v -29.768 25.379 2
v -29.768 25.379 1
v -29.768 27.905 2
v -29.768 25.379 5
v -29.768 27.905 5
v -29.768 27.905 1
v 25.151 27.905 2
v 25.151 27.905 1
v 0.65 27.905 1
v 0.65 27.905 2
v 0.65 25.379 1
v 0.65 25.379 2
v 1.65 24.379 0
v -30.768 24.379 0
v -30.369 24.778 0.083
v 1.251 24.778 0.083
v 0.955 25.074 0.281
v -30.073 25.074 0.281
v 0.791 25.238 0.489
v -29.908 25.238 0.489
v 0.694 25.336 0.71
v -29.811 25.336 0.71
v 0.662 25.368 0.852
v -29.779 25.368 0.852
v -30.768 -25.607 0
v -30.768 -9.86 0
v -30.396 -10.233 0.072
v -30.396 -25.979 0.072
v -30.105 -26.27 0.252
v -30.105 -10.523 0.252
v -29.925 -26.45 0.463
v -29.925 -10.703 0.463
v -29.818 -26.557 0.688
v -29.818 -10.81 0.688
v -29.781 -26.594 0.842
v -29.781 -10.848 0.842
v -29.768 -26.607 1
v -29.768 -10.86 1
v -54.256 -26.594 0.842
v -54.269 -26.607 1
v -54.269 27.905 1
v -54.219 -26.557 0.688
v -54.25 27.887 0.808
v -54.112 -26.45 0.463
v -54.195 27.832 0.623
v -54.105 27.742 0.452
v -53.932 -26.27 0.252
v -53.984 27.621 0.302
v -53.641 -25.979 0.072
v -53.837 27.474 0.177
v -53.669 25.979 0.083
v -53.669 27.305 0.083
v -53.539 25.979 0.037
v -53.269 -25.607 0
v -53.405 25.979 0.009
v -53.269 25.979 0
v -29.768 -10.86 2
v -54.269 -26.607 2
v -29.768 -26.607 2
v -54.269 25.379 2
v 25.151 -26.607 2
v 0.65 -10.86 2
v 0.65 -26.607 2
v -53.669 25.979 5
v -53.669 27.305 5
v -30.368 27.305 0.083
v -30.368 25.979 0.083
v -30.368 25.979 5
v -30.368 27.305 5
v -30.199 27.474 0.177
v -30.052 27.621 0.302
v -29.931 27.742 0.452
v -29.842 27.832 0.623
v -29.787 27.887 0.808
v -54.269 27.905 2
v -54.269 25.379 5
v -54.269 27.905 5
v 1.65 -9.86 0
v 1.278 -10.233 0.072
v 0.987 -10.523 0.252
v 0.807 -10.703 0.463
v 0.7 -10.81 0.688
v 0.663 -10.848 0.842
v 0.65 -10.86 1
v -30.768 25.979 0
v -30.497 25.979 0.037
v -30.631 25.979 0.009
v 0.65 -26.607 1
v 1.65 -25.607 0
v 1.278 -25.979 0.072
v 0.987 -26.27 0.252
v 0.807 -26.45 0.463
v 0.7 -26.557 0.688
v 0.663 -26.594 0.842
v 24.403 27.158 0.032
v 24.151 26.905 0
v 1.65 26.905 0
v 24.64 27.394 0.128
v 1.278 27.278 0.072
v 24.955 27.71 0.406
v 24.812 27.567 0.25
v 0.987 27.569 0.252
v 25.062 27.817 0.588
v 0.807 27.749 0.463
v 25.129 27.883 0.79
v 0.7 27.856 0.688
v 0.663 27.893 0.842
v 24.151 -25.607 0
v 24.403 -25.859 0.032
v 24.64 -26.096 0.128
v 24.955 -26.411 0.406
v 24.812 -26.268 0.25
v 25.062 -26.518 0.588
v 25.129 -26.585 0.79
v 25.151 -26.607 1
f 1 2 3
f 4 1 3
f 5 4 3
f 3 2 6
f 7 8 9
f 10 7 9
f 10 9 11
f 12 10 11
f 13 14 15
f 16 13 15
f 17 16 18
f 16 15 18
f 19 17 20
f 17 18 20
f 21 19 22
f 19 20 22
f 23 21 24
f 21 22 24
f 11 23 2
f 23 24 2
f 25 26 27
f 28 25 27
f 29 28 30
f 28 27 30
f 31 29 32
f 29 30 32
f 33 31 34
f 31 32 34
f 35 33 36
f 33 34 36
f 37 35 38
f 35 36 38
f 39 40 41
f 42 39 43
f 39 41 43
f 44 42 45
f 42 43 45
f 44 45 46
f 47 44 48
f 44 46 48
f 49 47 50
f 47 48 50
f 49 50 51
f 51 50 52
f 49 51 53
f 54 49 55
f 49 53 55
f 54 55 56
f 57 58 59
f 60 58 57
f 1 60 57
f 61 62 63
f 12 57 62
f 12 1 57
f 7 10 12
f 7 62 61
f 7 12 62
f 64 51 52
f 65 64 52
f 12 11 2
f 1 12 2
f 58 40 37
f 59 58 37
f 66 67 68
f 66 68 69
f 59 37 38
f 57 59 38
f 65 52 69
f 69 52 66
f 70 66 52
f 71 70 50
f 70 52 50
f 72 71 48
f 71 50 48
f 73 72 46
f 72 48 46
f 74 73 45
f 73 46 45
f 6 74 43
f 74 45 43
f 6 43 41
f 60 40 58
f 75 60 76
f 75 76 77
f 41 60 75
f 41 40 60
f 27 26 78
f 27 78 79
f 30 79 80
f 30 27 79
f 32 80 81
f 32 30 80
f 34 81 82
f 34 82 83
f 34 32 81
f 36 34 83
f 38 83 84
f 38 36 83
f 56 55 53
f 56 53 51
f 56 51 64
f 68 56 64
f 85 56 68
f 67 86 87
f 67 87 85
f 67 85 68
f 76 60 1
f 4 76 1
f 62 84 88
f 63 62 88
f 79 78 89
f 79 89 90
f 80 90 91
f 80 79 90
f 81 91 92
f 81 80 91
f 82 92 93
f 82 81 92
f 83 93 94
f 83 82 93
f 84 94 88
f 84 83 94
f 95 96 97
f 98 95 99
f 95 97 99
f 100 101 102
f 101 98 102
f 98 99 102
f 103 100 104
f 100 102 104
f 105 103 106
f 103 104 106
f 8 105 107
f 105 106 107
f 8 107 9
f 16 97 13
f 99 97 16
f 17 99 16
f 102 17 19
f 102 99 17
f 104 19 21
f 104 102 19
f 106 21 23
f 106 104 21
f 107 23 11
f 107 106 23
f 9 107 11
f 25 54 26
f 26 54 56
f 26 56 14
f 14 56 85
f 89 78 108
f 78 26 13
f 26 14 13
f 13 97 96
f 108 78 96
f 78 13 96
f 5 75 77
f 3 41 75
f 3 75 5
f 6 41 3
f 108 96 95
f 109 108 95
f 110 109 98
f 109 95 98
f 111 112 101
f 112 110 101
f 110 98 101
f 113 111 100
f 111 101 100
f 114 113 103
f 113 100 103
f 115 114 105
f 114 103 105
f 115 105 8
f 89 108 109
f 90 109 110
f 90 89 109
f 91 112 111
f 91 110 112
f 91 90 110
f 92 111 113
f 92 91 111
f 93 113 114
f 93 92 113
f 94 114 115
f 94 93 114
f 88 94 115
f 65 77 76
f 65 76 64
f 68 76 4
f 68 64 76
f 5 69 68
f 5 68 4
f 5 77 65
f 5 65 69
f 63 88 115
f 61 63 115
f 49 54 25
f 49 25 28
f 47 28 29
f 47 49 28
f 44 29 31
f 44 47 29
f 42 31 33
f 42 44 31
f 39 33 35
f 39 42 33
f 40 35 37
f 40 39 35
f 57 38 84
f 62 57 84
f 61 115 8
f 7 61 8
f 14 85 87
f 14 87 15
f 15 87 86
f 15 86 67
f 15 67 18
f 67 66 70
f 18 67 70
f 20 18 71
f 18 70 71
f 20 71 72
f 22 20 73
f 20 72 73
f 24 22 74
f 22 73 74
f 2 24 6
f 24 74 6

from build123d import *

# Parameters (mm, degrees)
F1_DEPTH     = 2
F2_W         = 23.3004903048
F2_H         = 1.3265815725
F3_DEPTH     = 2
F2_W_2       = 24.5004919916
F2_H_2       = 2.5265832593
F4_DEPTH     = 3
F5_T1_DEPTH  = 29.5004919916
F5_T3_DEPTH  = 59.5122700134
F5_T5_DEPTH  = 5.0265832593
F5_T7_DEPTH  = 30.4185097339
F5_T9_DEPTH  = 18.246874844
F5_T11_DEPTH = 29.5004919916
F5_T17_DEPTH = 7.5265832593
F5_T21_DEPTH = 32.9185097339
F5_T28_DEPTH = 32.9185097339
F5_T32_DEPTH = 7.5265832593
F5_T39_DEPTH = 20.746874844
F5_T43_DEPTH = 32.9185097339
F5_T50_DEPTH = 32.9185097339
F5_T54_DEPTH = 20.746874844


# Not quite as in the source:
# - a fillet or chamfer that OpenCascade refuses, or shapes differently, is made with other operations: its cross-section is extruded or revolved along the edge and cut away or added


with BuildPart() as f1:
    # F0 (on Top) → F1 (new body)
    with BuildSketch(Plane.XY):
        Polygon((25.1509650471, -26.6069659193), (25.1509650471, 27.9053040941), (0.6504730554, 27.9053040941), (0.6504730554, 25.3787208349), (-29.7680366784, 25.3787208349), (-29.7680366784, 27.9053040941), (-54.2685286701, 27.9053040941), (-54.2685286701, -26.6069659193), (-29.7680366784, -26.6069659193), (-29.7680366784, -10.8600910753), (0.6504730554, -10.8600910753), (0.6504730554, -26.6069659193), align=None)
    extrude(amount=F1_DEPTH)

    # F0 (on Top) + F2 (on face) → F3 (cut)
    with BuildSketch(Plane.XY):
        Polygon((25.1509650471, -26.6069659193), (25.1509650471, 27.9053040941), (0.6504730554, 27.9053040941), (0.6504730554, 25.3787208349), (-29.7680366784, 25.3787208349), (-29.7680366784, 27.9053040941), (-54.2685286701, 27.9053040941), (-54.2685286701, -26.6069659193), (-29.7680366784, -26.6069659193), (-29.7680366784, -10.8600910753), (0.6504730554, -10.8600910753), (0.6504730554, -26.6069659193), align=None)
    with BuildSketch(Plane.XY.offset(2)):
        with Locations((-42.0182826743, 26.6420124645)):
            Rectangle(F2_W, F2_H)
    extrude(amount=-F3_DEPTH, mode=Mode.SUBTRACT)

    # F2 (on face) → F4 (join)
    with BuildSketch(Plane.XY.offset(2)):
        with Locations((-42.0182826743, 26.6420124645)):
            Rectangle(F2_W_2, F2_H_2)
        with Locations((-42.0182826743, 26.6420124645)):
            Rectangle(F2_W, F2_H, mode=Mode.SUBTRACT)
    extrude(amount=F4_DEPTH)

    # F5: fillet of radius 1 on 12 edges, made by hand

    # F5_s2 → F5_t1 (cut)
    with BuildSketch(Plane.YZ.offset(-56.7685286701)):
        with BuildLine():
            ThreePointArc((-25.6069659193, 0), (-26.3140727005, 0.2928932188), (-26.6069659193, 1))
            Line((-26.6069659193, 1), (-26.6069659193, 0))
            Line((-26.6069659193, 0), (-25.6069659193, 0))
        make_face()
        with BuildLine():
            ThreePointArc((26.9053040941, 0), (27.6124108753, 0.2928932188), (27.9053040941, 1))
            Line((27.9053040941, 1), (27.9053040941, 0))
            Line((27.9053040941, 0), (26.9053040941, 0))
        make_face()
    extrude(amount=F5_T1_DEPTH, mode=Mode.SUBTRACT)

    # F5_s4 → F5_t3 (cut)
    with BuildSketch(Plane.XZ.offset(-30.4053040941)):
        with BuildLine():
            ThreePointArc((-54.2685286701, 1), (-53.9756354513, 0.2928932188), (-53.2685286701, 0))
            Line((-53.2685286701, 0), (-54.2685286701, 0))
            Line((-54.2685286701, 0), (-54.2685286701, 1))
        make_face()
        with BuildLine():
            ThreePointArc((24.1509650471, 0), (24.8580718283, 0.2928932188), (25.1509650471, 1))
            Line((25.1509650471, 1), (25.1509650471, 0))
            Line((25.1509650471, 0), (24.1509650471, 0))
        make_face()
    extrude(amount=F5_T3_DEPTH, mode=Mode.SUBTRACT)

    # F5_s6 → F5_t5 (cut)
    with BuildSketch(Plane.XZ.offset(-30.4053040941)):
        with BuildLine():
            ThreePointArc((-30.7680366784, 0), (-30.0609298972, 0.2928932188), (-29.7680366784, 1))
            Line((-29.7680366784, 1), (-29.7680366784, 0))
            Line((-29.7680366784, 0), (-30.7680366784, 0))
        make_face()
        with BuildLine():
            ThreePointArc((1.6504730554, 0), (0.9433662742, 0.2928932188), (0.6504730554, 1))
            Line((0.6504730554, 1), (0.6504730554, 0))
            Line((0.6504730554, 0), (1.6504730554, 0))
        make_face()
    extrude(amount=F5_T5_DEPTH, mode=Mode.SUBTRACT)

    # F5_s8 → F5_t7 (cut)
    with BuildSketch(Plane.YZ.offset(-29.7680366784)):
        with BuildLine():
            ThreePointArc((24.3787208349, 0), (25.085827616, 0.2928932188), (25.3787208349, 1))
            Line((25.3787208349, 1), (25.3787208349, 0))
            Line((25.3787208349, 0), (24.3787208349, 0))
        make_face()
        with BuildLine():
            ThreePointArc((-9.8600910753, 0), (-10.5671978565, 0.2928932188), (-10.8600910753, 1))
            Line((-10.8600910753, 1), (-10.8600910753, 0))
            Line((-10.8600910753, 0), (-9.8600910753, 0))
        make_face()
    extrude(amount=F5_T7_DEPTH, mode=Mode.SUBTRACT)

    # F5_s10 → F5_t9 (cut)
    with BuildSketch(Plane.XZ.offset(10.8600910753)):
        with BuildLine():
            ThreePointArc((-30.7680366784, 0), (-30.0609298972, 0.2928932188), (-29.7680366784, 1))
            Line((-29.7680366784, 1), (-29.7680366784, 0))
            Line((-29.7680366784, 0), (-30.7680366784, 0))
        make_face()
        with BuildLine():
            ThreePointArc((1.6504730554, 0), (0.9433662742, 0.2928932188), (0.6504730554, 1))
            Line((0.6504730554, 1), (0.6504730554, 0))
            Line((0.6504730554, 0), (1.6504730554, 0))
        make_face()
    extrude(amount=F5_T9_DEPTH, mode=Mode.SUBTRACT)

    # F5_s12 → F5_t11 (cut)
    with BuildSketch(Plane.YZ.offset(-1.8495269446)):
        with BuildLine():
            ThreePointArc((-25.6069659193, 0), (-26.3140727005, 0.2928932188), (-26.6069659193, 1))
            Line((-26.6069659193, 1), (-26.6069659193, 0))
            Line((-26.6069659193, 0), (-25.6069659193, 0))
        make_face()
        with BuildLine():
            ThreePointArc((26.9053040941, 0), (27.6124108753, 0.2928932188), (27.9053040941, 1))
            Line((27.9053040941, 1), (27.9053040941, 0))
            Line((27.9053040941, 0), (26.9053040941, 0))
        make_face()
    extrude(amount=F5_T11_DEPTH, mode=Mode.SUBTRACT)


with BuildPart() as f5_tool15:
    # F5_s16 → F5_t17 (new body)
    with BuildSketch(Plane.XZ.offset(-22.8787208349)):
        with BuildLine():
            ThreePointArc((-30.7680366784, 0), (-30.0609298972, 0.2928932188), (-29.7680366784, 1))
            Line((-29.7680366784, 1), (-29.7680366784, 0))
            Line((-29.7680366784, 0), (-30.7680366784, 0))
        make_face()
    extrude(amount=-F5_T17_DEPTH)

    split(bisect_by=Plane.XZ.offset(-25.3787208349), keep=Keep.TOP)


with BuildPart() as f5_tool19:
    # F5_s20 → F5_t21 (new body)
    with BuildSketch(Plane.YZ.offset(0.6504730554)):
        with BuildLine():
            ThreePointArc((24.3787208349, 0), (25.085827616, 0.2928932188), (25.3787208349, 1))
            Line((25.3787208349, 1), (25.3787208349, 0))
            Line((25.3787208349, 0), (24.3787208349, 0))
        make_face()
    extrude(amount=-F5_T21_DEPTH)

    split(bisect_by=Plane.YZ.offset(-29.7680366784), keep=Keep.BOTTOM)


with BuildPart() as f5_tool15_1:
    add(f5_tool15.part)

    # F5_t23: intersect F5_tool19
    add(f5_tool19.part, mode=Mode.INTERSECT)


with BuildPart() as f1_1:
    add(f1.part)

    # F5_t13: cut F5_tool15
    add(f5_tool15_1.part, mode=Mode.SUBTRACT)


with BuildPart() as f5_tool26:
    # F5_s27 → F5_t28 (new body)
    with BuildSketch(Plane.YZ.offset(3.1504730554)):
        with BuildLine():
            ThreePointArc((24.3787208349, 0), (25.085827616, 0.2928932188), (25.3787208349, 1))
            Line((25.3787208349, 1), (25.3787208349, 0))
            Line((25.3787208349, 0), (24.3787208349, 0))
        make_face()
    extrude(amount=-F5_T28_DEPTH)

    split(bisect_by=Plane.YZ.offset(0.6504730554), keep=Keep.TOP)


with BuildPart() as f5_tool30:
    # F5_s31 → F5_t32 (new body)
    with BuildSketch(Plane.XZ.offset(-30.4053040941)):
        with BuildLine():
            ThreePointArc((1.6504730554, 0), (0.9433662742, 0.2928932188), (0.6504730554, 1))
            Line((0.6504730554, 1), (0.6504730554, 0))
            Line((0.6504730554, 0), (1.6504730554, 0))
        make_face()
    extrude(amount=F5_T32_DEPTH)

    split(bisect_by=Plane.XZ.offset(-25.3787208349), keep=Keep.TOP)


with BuildPart() as f5_tool26_1:
    add(f5_tool26.part)

    # F5_t34: intersect F5_tool30
    add(f5_tool30.part, mode=Mode.INTERSECT)


with BuildPart() as f1_2:
    add(f1_1.part)

    # F5_t24: cut F5_tool26
    add(f5_tool26_1.part, mode=Mode.SUBTRACT)


with BuildPart() as f5_tool37:
    # F5_s38 → F5_t39 (new body)
    with BuildSketch(Plane.XZ.offset(29.1069659193)):
        with BuildLine():
            ThreePointArc((-30.7680366784, 0), (-30.0609298972, 0.2928932188), (-29.7680366784, 1))
            Line((-29.7680366784, 1), (-29.7680366784, 0))
            Line((-29.7680366784, 0), (-30.7680366784, 0))
        make_face()
    extrude(amount=-F5_T39_DEPTH)

    split(bisect_by=Plane.XZ.offset(10.8600910753), keep=Keep.BOTTOM)


with BuildPart() as f5_tool41:
    # F5_s42 → F5_t43 (new body)
    with BuildSketch(Plane.YZ.offset(-32.2680366784)):
        with BuildLine():
            ThreePointArc((-9.8600910753, 0), (-10.5671978565, 0.2928932188), (-10.8600910753, 1))
            Line((-10.8600910753, 1), (-10.8600910753, 0))
            Line((-10.8600910753, 0), (-9.8600910753, 0))
        make_face()
    extrude(amount=F5_T43_DEPTH)

    split(bisect_by=Plane.YZ.offset(-29.7680366784), keep=Keep.BOTTOM)


with BuildPart() as f5_tool37_1:
    add(f5_tool37.part)

    # F5_t45: intersect F5_tool41
    add(f5_tool41.part, mode=Mode.INTERSECT)


with BuildPart() as f1_3:
    add(f1_2.part)

    # F5_t35: cut F5_tool37
    add(f5_tool37_1.part, mode=Mode.SUBTRACT)


with BuildPart() as f5_tool48:
    # F5_s49 → F5_t50 (new body)
    with BuildSketch(Plane.YZ.offset(-29.7680366784)):
        with BuildLine():
            ThreePointArc((-9.8600910753, 0), (-10.5671978565, 0.2928932188), (-10.8600910753, 1))
            Line((-10.8600910753, 1), (-10.8600910753, 0))
            Line((-10.8600910753, 0), (-9.8600910753, 0))
        make_face()
    extrude(amount=F5_T50_DEPTH)

    split(bisect_by=Plane.YZ.offset(0.6504730554), keep=Keep.TOP)


with BuildPart() as f5_tool52:
    # F5_s53 → F5_t54 (new body)
    with BuildSketch(Plane.XZ.offset(8.3600910753)):
        with BuildLine():
            ThreePointArc((1.6504730554, 0), (0.9433662742, 0.2928932188), (0.6504730554, 1))
            Line((0.6504730554, 1), (0.6504730554, 0))
            Line((0.6504730554, 0), (1.6504730554, 0))
        make_face()
    extrude(amount=F5_T54_DEPTH)

    split(bisect_by=Plane.XZ.offset(10.8600910753), keep=Keep.BOTTOM)


with BuildPart() as f5_tool48_1:
    add(f5_tool48.part)

    # F5_t56: intersect F5_tool52
    add(f5_tool52.part, mode=Mode.INTERSECT)


with BuildPart() as f1_4:
    add(f1_3.part)

    # F5_t46: cut F5_tool48
    add(f5_tool48_1.part, mode=Mode.SUBTRACT)


solid = f1_4.part
